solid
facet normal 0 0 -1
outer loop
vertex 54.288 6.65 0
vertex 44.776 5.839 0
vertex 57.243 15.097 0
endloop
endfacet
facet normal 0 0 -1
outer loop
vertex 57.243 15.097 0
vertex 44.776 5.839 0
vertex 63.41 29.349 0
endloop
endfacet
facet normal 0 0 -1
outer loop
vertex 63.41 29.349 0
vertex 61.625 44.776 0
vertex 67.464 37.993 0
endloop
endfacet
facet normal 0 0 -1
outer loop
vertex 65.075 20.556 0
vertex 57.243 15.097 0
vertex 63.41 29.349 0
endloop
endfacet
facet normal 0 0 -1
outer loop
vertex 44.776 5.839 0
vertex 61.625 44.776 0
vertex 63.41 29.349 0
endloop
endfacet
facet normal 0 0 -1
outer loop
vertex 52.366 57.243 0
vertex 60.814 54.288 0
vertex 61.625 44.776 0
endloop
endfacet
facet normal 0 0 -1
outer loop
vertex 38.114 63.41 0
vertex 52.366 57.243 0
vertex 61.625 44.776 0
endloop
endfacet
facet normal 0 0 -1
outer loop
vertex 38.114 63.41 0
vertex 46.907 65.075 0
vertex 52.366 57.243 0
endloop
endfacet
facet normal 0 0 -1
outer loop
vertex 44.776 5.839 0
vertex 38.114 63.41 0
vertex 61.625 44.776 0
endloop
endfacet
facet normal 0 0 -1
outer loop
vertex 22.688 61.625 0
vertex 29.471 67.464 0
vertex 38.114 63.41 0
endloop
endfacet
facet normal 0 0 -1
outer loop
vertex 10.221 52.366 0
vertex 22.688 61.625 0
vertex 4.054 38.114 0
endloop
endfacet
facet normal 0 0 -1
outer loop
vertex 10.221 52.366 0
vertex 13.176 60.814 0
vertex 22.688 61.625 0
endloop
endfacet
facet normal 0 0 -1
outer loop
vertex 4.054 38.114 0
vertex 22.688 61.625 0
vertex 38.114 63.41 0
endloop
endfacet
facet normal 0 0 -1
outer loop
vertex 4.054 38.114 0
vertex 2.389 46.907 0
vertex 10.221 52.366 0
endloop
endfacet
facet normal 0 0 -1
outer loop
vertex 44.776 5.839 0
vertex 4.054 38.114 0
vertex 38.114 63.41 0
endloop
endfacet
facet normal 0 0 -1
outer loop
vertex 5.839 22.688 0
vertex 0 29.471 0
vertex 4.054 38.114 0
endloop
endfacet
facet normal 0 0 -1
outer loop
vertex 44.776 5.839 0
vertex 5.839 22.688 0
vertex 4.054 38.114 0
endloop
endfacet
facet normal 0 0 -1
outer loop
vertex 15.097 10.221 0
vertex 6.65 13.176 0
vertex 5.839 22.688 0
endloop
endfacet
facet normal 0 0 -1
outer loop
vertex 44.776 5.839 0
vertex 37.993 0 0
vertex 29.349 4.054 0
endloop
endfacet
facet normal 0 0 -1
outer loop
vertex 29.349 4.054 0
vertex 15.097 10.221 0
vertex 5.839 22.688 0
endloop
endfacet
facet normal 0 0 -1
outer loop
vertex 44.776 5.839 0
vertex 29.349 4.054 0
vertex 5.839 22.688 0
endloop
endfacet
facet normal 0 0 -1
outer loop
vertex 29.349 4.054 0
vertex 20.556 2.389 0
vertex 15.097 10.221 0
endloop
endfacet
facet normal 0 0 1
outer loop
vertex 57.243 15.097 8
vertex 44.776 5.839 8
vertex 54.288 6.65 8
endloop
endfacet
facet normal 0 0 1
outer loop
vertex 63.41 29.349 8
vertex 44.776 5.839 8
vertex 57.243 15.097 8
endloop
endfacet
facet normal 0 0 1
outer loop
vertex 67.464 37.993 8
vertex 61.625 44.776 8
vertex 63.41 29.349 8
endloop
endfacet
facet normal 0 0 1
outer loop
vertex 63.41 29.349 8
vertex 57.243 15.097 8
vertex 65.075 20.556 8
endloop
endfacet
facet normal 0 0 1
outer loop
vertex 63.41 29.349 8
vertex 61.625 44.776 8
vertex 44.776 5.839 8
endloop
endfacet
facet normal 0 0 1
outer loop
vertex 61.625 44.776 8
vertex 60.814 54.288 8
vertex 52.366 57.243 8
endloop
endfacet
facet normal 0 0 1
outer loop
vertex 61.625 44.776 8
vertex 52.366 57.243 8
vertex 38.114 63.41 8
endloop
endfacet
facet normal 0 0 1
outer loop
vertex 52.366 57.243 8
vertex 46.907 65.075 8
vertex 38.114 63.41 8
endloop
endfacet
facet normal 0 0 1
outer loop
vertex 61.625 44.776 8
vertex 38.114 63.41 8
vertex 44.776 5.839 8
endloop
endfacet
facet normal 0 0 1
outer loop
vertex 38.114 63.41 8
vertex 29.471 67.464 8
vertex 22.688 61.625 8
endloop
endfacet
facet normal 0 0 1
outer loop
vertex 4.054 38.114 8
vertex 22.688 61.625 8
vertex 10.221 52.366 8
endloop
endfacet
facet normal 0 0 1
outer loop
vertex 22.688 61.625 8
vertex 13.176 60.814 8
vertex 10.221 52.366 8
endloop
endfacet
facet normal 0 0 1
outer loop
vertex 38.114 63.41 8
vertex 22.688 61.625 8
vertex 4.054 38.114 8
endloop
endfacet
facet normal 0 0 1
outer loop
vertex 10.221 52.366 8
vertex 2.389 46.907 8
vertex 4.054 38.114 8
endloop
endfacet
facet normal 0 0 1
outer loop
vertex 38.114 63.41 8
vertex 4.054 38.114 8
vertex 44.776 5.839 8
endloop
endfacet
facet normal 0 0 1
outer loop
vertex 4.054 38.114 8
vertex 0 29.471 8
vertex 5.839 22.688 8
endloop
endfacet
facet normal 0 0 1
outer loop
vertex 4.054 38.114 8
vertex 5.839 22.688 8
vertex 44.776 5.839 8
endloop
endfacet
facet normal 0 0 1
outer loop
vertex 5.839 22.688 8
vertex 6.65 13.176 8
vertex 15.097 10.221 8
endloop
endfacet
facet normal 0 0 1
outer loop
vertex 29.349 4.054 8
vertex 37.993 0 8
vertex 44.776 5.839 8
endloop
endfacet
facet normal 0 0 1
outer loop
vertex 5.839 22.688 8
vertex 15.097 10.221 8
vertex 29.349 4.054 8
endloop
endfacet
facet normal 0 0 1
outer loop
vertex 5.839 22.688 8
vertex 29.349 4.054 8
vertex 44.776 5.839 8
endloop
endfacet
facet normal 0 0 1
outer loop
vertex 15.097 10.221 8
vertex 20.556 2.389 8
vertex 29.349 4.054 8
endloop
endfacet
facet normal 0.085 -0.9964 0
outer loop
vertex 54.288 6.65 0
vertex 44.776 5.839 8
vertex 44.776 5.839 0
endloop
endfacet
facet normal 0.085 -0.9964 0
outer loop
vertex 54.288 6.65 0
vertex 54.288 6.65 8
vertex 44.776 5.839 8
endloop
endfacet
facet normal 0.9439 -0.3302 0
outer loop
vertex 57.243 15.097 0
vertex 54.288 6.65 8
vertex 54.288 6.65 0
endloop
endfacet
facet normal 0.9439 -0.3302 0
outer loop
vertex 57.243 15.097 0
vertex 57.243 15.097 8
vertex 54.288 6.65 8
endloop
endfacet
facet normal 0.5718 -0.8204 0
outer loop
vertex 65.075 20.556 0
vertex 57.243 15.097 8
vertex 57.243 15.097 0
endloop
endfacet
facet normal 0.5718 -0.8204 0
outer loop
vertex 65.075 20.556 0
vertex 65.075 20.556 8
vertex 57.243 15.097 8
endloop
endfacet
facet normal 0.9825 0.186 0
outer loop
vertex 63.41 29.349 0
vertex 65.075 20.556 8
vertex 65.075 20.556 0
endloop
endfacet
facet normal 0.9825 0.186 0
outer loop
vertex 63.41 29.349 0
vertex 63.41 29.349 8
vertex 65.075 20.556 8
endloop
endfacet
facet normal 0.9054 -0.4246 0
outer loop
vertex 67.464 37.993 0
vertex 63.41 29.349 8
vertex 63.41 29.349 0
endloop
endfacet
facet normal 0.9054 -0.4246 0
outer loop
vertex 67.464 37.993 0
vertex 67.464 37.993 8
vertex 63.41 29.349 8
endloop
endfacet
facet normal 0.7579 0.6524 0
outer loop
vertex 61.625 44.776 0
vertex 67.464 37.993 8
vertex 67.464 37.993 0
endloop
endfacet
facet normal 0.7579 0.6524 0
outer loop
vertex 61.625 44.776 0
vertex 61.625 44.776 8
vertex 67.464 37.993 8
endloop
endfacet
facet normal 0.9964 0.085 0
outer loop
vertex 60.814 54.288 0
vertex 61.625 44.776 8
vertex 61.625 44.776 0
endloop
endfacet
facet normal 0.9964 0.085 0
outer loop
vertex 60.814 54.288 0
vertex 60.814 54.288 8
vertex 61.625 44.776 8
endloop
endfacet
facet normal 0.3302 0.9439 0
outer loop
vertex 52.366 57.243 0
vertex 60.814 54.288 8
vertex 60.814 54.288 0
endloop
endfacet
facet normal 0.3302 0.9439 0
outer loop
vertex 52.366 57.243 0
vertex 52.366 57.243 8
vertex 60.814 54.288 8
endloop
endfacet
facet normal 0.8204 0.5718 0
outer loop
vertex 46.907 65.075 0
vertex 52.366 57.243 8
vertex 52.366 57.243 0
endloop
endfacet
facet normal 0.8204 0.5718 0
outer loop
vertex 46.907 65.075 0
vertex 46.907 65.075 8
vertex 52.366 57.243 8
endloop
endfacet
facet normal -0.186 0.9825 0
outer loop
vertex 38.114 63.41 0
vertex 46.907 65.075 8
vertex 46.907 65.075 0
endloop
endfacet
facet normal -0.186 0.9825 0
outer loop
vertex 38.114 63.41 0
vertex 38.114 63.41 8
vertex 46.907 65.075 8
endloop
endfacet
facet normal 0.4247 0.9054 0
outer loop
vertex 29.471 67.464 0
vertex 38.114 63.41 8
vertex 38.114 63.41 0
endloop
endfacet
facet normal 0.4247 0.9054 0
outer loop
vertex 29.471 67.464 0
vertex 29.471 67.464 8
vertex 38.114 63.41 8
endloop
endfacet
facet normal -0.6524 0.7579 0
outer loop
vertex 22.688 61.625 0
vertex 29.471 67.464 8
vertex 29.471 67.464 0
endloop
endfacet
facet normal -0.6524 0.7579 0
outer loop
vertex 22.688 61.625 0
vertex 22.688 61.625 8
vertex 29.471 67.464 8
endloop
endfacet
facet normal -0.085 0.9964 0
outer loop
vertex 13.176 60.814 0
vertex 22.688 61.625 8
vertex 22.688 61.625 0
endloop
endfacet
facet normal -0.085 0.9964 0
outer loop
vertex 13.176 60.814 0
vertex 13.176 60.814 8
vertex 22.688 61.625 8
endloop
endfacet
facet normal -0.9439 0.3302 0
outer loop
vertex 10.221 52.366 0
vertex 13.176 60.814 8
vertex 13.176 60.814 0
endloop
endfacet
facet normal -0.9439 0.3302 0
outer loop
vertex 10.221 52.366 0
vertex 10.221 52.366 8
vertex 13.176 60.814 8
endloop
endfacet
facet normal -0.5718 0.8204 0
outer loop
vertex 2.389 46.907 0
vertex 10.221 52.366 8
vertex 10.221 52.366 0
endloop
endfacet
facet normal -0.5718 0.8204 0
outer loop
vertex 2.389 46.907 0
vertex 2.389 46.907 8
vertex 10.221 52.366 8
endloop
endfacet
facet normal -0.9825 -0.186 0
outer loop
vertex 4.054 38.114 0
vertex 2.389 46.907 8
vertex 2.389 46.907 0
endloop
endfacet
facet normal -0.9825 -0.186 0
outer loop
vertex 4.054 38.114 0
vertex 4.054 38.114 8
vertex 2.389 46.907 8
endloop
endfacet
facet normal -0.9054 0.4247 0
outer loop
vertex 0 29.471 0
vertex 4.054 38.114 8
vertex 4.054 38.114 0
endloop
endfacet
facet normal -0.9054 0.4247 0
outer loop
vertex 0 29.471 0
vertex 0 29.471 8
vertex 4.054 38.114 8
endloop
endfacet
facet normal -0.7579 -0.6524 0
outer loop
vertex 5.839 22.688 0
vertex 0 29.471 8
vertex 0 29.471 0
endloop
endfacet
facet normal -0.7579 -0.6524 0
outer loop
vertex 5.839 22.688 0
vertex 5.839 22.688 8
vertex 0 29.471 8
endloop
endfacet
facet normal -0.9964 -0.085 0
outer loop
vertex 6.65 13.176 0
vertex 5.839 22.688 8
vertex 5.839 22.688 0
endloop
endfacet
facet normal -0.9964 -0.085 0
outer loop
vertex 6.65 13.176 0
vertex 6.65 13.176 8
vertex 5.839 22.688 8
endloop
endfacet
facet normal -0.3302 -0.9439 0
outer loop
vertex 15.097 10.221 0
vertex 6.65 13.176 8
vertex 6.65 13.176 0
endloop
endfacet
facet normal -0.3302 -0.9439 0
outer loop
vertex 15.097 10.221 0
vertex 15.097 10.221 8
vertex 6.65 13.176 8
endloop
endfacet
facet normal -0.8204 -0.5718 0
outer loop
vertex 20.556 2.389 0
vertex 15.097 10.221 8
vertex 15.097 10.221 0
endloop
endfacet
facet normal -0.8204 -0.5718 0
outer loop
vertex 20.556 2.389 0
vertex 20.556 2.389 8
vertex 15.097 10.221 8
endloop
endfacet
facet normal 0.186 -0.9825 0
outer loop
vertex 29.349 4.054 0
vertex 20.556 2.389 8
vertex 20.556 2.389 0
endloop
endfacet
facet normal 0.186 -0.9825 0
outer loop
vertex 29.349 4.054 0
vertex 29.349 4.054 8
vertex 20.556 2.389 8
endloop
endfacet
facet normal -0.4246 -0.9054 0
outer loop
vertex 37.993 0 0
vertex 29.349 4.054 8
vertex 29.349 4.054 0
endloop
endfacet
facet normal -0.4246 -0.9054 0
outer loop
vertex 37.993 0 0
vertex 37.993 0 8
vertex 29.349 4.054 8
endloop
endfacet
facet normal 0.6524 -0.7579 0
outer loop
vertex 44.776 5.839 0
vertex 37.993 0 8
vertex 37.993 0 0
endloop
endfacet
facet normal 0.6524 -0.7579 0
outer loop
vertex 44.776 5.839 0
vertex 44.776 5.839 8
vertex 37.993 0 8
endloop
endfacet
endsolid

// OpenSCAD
$fn = 32;

// ----------------------------------------------------------------------
// Chain sprocket: 12 teeth, 30 mm root radius
// ----------------------------------------------------------------------

// --- parameters (mm) ---
profile_height = 8;       // extrusion height
profile_points = 24;      // points of the closed outline

profile = [[63.41, 29.349], [67.464, 37.993], [61.625, 44.776], [60.814, 54.288], [52.366, 57.243], [46.907, 65.075], [38.114, 63.41], [29.471, 67.464], [22.688, 61.625], [13.176, 60.814], [10.221, 52.366], [2.389, 46.907], [4.054, 38.114], [0, 29.471], [5.839, 22.688], [6.65, 13.176], [15.097, 10.221], [20.556, 2.389], [29.349, 4.054], [37.993, 0], [44.776, 5.839], [54.288, 6.65], [57.243, 15.097], [65.075, 20.556]];  // single closed polygon, 24 points, counter clockwise

// --- the one profile operation ---
linear_extrude(height = profile_height) polygon(points = profile);
